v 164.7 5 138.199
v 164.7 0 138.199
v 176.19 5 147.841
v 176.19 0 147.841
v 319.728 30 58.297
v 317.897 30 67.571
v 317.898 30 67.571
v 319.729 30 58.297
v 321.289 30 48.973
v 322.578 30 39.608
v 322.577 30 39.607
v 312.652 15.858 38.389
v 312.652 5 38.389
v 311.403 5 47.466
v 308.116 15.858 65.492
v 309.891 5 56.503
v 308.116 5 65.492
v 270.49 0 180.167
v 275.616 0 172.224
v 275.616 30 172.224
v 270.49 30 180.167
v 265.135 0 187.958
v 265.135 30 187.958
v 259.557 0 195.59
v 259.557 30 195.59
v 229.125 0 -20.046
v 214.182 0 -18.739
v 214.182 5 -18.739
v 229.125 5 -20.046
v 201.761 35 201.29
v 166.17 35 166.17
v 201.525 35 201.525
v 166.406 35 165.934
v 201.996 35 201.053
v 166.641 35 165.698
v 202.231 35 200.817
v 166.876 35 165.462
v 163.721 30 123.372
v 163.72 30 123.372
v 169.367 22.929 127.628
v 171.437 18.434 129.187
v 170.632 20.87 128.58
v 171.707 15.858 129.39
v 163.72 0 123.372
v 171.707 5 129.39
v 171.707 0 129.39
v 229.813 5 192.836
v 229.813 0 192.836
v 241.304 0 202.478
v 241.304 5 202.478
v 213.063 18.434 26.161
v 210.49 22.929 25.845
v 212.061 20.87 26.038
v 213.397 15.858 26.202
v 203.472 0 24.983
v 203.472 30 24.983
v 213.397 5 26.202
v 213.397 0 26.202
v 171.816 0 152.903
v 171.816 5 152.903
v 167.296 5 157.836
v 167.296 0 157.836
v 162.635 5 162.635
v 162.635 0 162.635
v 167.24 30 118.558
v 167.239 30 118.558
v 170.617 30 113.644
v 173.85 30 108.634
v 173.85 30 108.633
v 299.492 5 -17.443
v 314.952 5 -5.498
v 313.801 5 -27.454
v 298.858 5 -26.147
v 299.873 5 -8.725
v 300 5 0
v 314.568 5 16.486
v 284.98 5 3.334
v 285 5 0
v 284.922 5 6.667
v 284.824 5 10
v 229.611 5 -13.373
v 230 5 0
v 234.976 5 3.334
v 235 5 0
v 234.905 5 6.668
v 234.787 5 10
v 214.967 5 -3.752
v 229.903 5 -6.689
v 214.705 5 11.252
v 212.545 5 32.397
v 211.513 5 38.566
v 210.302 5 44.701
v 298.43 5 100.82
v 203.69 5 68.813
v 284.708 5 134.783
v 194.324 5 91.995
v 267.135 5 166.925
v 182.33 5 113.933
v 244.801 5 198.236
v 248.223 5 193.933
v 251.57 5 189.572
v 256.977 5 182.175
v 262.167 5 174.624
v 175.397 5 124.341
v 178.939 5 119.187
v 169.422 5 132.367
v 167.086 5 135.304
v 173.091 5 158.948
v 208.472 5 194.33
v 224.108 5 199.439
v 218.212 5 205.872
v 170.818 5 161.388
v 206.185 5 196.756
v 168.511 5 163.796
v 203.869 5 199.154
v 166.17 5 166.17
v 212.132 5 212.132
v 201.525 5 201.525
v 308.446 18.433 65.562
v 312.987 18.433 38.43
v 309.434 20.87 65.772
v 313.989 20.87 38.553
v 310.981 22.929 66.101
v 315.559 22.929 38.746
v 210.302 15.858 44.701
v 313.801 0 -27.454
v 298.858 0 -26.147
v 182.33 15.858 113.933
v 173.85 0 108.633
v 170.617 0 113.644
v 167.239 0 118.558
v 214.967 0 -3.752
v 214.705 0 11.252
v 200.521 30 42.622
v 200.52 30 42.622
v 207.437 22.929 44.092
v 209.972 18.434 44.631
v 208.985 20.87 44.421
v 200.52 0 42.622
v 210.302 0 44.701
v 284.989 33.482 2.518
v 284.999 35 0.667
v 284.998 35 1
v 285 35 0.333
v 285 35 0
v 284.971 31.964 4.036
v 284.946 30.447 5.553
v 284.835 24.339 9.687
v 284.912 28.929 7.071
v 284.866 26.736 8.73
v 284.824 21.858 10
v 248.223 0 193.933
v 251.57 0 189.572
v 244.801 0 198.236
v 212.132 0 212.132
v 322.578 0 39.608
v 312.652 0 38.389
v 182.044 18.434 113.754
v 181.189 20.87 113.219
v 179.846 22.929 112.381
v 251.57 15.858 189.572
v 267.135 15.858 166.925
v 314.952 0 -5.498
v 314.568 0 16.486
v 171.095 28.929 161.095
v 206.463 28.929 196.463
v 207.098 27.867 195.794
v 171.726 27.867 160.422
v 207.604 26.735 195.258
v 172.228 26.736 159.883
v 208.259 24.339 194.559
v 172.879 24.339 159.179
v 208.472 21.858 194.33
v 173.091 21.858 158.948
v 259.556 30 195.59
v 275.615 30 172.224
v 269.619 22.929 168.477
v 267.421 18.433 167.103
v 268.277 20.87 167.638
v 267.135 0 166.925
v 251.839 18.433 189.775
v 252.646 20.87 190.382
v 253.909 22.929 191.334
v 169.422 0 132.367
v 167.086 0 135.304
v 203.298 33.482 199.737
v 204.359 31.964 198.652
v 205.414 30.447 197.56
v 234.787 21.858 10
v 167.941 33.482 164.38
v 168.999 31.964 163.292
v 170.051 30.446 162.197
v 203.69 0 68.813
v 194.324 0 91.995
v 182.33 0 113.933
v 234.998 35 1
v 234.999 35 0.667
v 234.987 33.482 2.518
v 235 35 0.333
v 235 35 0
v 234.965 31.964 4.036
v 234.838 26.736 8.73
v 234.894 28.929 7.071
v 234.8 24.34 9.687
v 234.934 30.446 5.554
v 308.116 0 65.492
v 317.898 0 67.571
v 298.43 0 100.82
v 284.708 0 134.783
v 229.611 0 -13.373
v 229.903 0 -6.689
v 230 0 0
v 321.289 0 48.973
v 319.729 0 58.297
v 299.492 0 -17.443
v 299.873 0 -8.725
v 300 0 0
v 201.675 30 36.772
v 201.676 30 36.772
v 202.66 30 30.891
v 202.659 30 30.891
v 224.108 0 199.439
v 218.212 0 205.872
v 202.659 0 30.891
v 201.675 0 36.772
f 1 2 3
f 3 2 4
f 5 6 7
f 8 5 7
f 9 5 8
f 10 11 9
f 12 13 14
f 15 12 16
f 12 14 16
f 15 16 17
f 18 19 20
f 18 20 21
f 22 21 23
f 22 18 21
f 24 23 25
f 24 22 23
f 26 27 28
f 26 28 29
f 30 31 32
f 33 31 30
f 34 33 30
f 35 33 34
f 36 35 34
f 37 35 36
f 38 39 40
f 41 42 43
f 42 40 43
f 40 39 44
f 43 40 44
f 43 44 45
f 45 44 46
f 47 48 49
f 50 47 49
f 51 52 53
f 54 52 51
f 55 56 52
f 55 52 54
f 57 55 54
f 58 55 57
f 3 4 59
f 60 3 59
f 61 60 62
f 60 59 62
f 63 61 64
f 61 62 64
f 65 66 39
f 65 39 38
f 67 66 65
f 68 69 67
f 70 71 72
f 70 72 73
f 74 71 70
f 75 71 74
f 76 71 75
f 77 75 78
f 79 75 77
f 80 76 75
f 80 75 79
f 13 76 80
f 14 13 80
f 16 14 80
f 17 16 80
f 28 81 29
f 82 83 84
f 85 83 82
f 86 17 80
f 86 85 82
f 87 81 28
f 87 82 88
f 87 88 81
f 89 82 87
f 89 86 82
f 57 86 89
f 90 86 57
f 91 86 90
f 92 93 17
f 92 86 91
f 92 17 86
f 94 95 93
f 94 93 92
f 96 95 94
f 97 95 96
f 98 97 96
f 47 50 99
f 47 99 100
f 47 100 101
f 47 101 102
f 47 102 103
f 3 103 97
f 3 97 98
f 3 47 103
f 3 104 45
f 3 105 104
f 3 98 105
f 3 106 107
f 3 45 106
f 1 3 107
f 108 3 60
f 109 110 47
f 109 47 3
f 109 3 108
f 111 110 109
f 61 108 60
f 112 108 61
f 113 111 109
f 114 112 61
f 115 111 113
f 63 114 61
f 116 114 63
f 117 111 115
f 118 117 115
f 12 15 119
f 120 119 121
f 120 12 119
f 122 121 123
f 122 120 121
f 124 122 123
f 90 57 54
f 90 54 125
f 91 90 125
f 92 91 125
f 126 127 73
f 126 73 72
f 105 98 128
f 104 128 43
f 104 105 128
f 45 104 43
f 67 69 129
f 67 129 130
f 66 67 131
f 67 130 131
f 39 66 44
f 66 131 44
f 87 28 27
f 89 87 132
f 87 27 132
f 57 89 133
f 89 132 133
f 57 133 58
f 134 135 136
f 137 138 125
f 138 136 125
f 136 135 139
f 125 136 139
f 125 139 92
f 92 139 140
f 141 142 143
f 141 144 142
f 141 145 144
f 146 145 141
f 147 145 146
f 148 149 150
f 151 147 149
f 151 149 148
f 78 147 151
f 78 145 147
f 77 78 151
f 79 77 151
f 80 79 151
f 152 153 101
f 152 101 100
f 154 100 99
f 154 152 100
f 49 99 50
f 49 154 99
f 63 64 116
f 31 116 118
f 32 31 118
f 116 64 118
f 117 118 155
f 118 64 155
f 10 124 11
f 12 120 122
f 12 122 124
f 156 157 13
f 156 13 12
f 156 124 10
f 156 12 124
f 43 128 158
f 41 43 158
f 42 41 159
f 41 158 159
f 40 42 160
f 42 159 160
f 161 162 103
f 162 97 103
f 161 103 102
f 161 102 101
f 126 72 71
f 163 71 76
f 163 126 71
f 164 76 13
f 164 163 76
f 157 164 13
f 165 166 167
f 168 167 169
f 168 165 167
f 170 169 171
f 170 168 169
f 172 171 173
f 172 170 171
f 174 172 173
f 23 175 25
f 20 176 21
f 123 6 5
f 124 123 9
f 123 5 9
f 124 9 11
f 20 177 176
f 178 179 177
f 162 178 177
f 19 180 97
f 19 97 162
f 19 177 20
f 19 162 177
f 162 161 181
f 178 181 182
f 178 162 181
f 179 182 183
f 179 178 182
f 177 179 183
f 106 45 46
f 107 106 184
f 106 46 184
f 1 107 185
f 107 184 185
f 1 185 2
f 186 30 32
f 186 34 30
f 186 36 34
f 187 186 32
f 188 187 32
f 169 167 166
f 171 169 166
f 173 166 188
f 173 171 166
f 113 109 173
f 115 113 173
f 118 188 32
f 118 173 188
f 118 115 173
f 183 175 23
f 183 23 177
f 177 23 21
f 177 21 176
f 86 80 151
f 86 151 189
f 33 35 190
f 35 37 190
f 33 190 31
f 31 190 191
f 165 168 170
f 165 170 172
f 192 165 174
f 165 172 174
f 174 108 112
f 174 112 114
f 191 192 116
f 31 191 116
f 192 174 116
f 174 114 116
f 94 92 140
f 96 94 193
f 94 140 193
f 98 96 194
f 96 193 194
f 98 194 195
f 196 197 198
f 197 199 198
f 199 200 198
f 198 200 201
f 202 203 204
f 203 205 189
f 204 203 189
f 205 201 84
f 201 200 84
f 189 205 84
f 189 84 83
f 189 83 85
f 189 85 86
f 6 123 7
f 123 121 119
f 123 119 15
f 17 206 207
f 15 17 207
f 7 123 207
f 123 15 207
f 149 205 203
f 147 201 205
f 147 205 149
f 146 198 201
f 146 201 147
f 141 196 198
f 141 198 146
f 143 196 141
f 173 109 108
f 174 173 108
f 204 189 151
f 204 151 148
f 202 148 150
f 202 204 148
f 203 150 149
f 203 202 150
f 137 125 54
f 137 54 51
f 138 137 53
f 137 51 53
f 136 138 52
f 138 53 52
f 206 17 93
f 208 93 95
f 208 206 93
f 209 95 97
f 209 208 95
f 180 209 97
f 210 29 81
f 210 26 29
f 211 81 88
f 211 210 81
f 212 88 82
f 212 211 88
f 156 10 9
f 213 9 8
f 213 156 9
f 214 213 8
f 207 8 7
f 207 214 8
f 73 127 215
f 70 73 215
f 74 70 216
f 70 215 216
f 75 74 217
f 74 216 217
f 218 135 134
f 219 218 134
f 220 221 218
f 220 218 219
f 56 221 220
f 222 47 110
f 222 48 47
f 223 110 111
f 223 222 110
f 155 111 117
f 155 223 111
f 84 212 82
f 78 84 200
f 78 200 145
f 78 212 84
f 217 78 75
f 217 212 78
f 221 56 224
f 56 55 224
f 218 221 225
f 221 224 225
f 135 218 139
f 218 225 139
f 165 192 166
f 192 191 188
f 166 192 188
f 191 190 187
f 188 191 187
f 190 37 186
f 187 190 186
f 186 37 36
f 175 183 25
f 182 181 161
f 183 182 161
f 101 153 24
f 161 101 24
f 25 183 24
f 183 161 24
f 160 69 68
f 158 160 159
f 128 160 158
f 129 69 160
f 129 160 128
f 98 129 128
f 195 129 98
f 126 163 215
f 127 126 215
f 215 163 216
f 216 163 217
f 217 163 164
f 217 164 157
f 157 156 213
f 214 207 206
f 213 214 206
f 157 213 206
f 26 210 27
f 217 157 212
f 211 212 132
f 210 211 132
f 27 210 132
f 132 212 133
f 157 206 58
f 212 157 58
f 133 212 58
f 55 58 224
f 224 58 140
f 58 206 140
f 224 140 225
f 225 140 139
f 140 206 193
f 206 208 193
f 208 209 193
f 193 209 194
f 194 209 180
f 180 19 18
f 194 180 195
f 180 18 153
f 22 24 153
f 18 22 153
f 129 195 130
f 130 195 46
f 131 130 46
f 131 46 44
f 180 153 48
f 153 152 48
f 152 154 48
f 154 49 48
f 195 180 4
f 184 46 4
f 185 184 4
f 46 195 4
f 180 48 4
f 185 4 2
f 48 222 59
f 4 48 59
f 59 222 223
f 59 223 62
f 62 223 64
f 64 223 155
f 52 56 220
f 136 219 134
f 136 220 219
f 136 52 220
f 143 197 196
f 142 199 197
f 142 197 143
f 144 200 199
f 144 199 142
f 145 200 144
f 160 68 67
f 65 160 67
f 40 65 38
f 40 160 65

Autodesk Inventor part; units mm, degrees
ref_plane "YZ Plane" through (0, 0, 0) normal (1, 0, 0) x (0, 1, 0)
ref_plane "XZ Plane" through (0, 0, 0) normal (0, 1, 0) x (-1, 0, 0)
ref_plane "XY Plane" through (0, 0, 0) normal (0, 0, 1) x (1, 0, 0)
sketch "Sketch1" plane through (0, 0, 0) normal (0, 1, 0) x (-1, 0, 0)
  circle A0 centre (0, 0) radius 215
  circle A1 centre (0, 0) radius 315
  line L0 (0, 0) -> (-315, 0)
  line L1 (0, 0) -> (-222.7386, 222.7386)
  line L2 (0, 0) -> (-313.8013, -27.4541)
  line L3 (0, 0) -> (-241.304, 202.4781)
  circle A2 centre (0, 0) radius 230
  circle A3 centre (0, 0) radius 300
  point P0 (-152.028, 152.028)
  point P1 (-215, 0)
  point P2 (-212.132, 212.132)
  point P3 (-229.8133, 192.8363)
  point P4 (-298.8584, -26.1467)
  point P5 (-300, 0)
  point P6 (-230, 0)
  point P7 (-229.1248, -20.0458)
  point P8 (-214.1819, -18.7385)
  point P9 (-164.6996, 138.1993)
  point P10 (-176.1902, 147.8412)
  point P11 (-162.6346, 162.6346)
  dimension "d1" = 430
  dimension "d2" = 45
  dimension "d31" = 100
  dimension "d47" = 5
  dimension "d48" = 5
  dimension "d49" = 15
  dimension "d50" = 15
extrude "Extrusion1" add sketch "Sketch1" along normal blind 5 contours L2 A2 L0 A0 | A0 L0 A2 L3 | A2 L3 A3 L1 | A2 L0 A3 L3 | L2 A1 L0 A3 | A3 L0 A1 L3
sketch "Sketch2" plane through (0, 0, 0) normal (0, 1, 0) x (1, 0, 0)
  circle A0 centre (0, 0) radius 205
  circle A1 centre (0, 0) radius 215
  circle A2 centre (0, 0) radius 315
  circle A3 centre (0, 0) radius 325
  line L0 (0, 0) -> (259.5565, -195.5899)
  line L1 (0, 0) -> (275.6156, -172.2238)
  line L2 (0, 0) -> (317.898, -67.5713)
  line L3 (0, 0) -> (322.5775, -39.6075)
  line L4 (300, 0) -> (230, 0) projected
  point P0 (315, 0)
  point P1 (215, 0)
  point P2 (312.652, -38.3888)
  point P3 (308.1165, -65.4922)
  point P4 (213.3974, -26.2019)
  point P5 (203.472, -24.9832)
  point P6 (200.5203, -42.6219)
  point P7 (210.3017, -44.701)
  point P8 (267.1352, -166.9246)
  point P9 (251.5702, -189.5717)
  point P10 (182.3303, -113.9326)
  point P11 (173.8499, -108.6334)
  point P12 (163.7203, -123.3721)
  point P13 (171.7066, -129.3902)
  dimension "d5" = 410
  dimension "d6" = 10
  dimension "d7" = 100
  dimension "d8" = 10
  dimension "d9" = 7
  dimension "d10" = 5
  dimension "d11" = 20
  dimension "d12" = 5
extrude "Extrusion2" add sketch "Sketch2" along normal blind 30 contours A0 L1 A1 L0 | L3 A1 L2 A0 | A2 L1 A3 L0 | L3 A3 L2 A2
chamfer "Chamfer1" distance 10 angle 45 4 edges at (177.1871, 30, 121.7773) (259.5997, 30, 178.418) (212.0514, 30, 35.4852) (310.68, 30, 51.99)
sketch "Sketch3" plane through (0, 5, 0) normal (0, 1, 0) x (1, 0, 0)
  circle A0 centre (0, 0) radius 235
  circle A1 centre (0, 0) radius 285
  arc A2 (251.5702, -189.5717) -> (267.1352, -166.9246) centre (0, 0) ccw projected
  arc A3 (308.1165, -65.4922) -> (312.652, -38.3888) centre (0, 0) ccw projected
  arc A4 (241.304, -202.4781) -> (251.5702, -189.5717) centre (0, 0) ccw projected
  line L0 (300, 0) -> (230, 0) projected
  arc A5 (213.3974, -26.2019) -> (214.1819, 18.7385) centre (0, 0) ccw projected
  line L1 (162.6346, -162.6346) -> (212.132, -212.132) projected
  line L2 (166.1701, -166.1701) -> (201.5254, -201.5254)
  arc A6 (312.652, -38.3888) -> (313.8013, 27.4541) centre (0, 0) ccw projected
  arc A7 (267.1352, -166.9246) -> (308.1165, -65.4922) centre (0, 0) ccw projected
  arc A8 (171.7066, -129.3902) -> (182.3303, -113.9326) centre (0, 0) ccw projected
  arc A9 (164.6996, -138.1993) -> (171.7066, -129.3902) centre (0, 0) ccw projected
  arc A10 (210.3017, -44.701) -> (213.3974, -26.2019) centre (0, 0) ccw projected
  arc A11 (182.3303, -113.9326) -> (210.3017, -44.701) centre (0, 0) ccw projected
  line L3 (235, 0) -> (284.6303, 0)
  line L4 (284.8245, -10) -> (234.7871, -10)
  line L5 (208.4724, -194.3303) -> (173.0906, -158.9485)
  line L6 (229.8133, -192.8363) -> (241.304, -202.4781) projected
  line L7 (313.8013, 27.4541) -> (298.8584, 26.1467) projected
  arc A12 (300, 0) -> (298.8584, 26.1467) centre (0, 0) ccw projected
  arc A13 (230, 0) -> (229.1248, 20.0458) centre (0, 0) ccw projected
  line L8 (229.1248, 20.0458) -> (214.1819, 18.7385) projected
  line L9 (164.6996, -138.1993) -> (176.1902, -147.8412) projected
  arc A14 (162.6346, -162.6346) -> (176.1902, -147.8412) centre (0, 0) ccw projected
  arc A15 (212.132, -212.132) -> (229.8133, -192.8363) centre (0, 0) ccw projected
  point P0 (235, 0)
  point P1 (172.3223, -159.7812)
  point P2 (208.9866, -193.7772)
  point P3 (166.1701, -166.1701)
  point P4 (201.5254, -201.5254)
  point P5 (285, 0)
  point P6 (235, 0)
  point P7 (183.8478, -183.8478)
  point P8 (187.3833, -187.3833)
  dimension "d18" = 470
  dimension "d22" = 0
  dimension "d32" = 50
  dimension "d33" = 10
  dimension "d34" = 0
  dimension "d43" = 10
extrude "Extrusion3" add sketch "Sketch3" along normal blind 30 contours L0 A1 L4 A0 | A0 L5 A1 L1
chamfer "Chamfer3" distance 9 angle 45 2 edges at (259.8058, 35, 10) (190.7815, 35, 176.6394)
fillet "Fillet1" radius 10 6 edges at (259.8058, 26, 10) (310.68, 20.0005, 51.99) (259.5997, 20.0005, 178.418) (177.1871, 20.0005, 121.7773) (212.0514, 20.0005, 35.4852) (190.7815, 26, 176.6394)
sketch "Sketch4" plane through (0, 5, 0) normal (0, 1, 0) x (1, 0, 0)
  arc A0 (201.5254, -201.5254) -> (208.4724, -194.3303) centre (0, 0) ccw projected
  line L0 (201.5254, -201.5254) -> (212.132, -212.132) projected
  arc A1 (241.304, -202.4781) -> (251.5702, -189.5717) centre (0, 0) ccw projected
  arc A2 (251.5702, -189.5717) -> (267.1352, -166.9246) centre (0, 0) ccw projected
  arc A3 (267.1352, -166.9246) -> (308.1165, -65.4922) centre (0, 0) ccw projected
  arc A4 (308.1165, -65.4922) -> (312.652, -38.3888) centre (0, 0) ccw projected
  arc A5 (312.652, -38.3888) -> (313.8013, 27.4541) centre (0, 0) ccw projected
  line L1 (300, 0) -> (285, 0) projected
  arc A6 (284.8245, -10) -> (285, 0) centre (0, 0) ccw projected
  line L2 (284.8245, -10) -> (234.7871, -10) projected
  arc A7 (234.7871, -10) -> (235, 0) centre (0, 0) ccw projected
  line L3 (235, 0) -> (230, 0) projected
  arc A8 (213.3974, -26.2019) -> (214.1819, 18.7385) centre (0, 0) ccw projected
  arc A9 (210.3017, -44.701) -> (213.3974, -26.2019) centre (0, 0) ccw projected
  arc A10 (182.3303, -113.9326) -> (210.3017, -44.701) centre (0, 0) ccw projected
  arc A11 (171.7066, -129.3902) -> (182.3303, -113.9326) centre (0, 0) ccw projected
  arc A12 (164.6996, -138.1993) -> (171.7066, -129.3902) centre (0, 0) ccw projected
  line L4 (162.6346, -162.6346) -> (166.1701, -166.1701) projected
  arc A13 (166.1701, -166.1701) -> (173.0906, -158.9485) centre (0, 0) ccw projected
  line L5 (234.7871, -10) -> (214.7673, -10)
  arc A14 (213.3974, -26.2019) -> (214.1819, 18.7385) centre (0, 0) ccw projected
  line L6 (284.8245, -10) -> (314.8412, -10)
  line L7 (171.8681, -160.2696) -> (157.241, -146.6296)
  line L8 (208.4358, -194.3695) -> (230.3764, -214.8295)
  arc A15 (241.304, -202.4781) -> (251.5702, -189.5717) centre (0, 0) ccw projected
  line L9 (173.0906, -158.9485) -> (208.4724, -194.3303) projected
  arc A16 (230, 0) -> (229.1248, 20.0458) centre (0, 0) ccw projected
  line L10 (229.1248, 20.0458) -> (214.1819, 18.7385) projected
  line L11 (164.6996, -138.1993) -> (176.1902, -147.8412) projected
  arc A17 (162.6346, -162.6346) -> (176.1902, -147.8412) centre (0, 0) ccw projected
  arc A18 (212.132, -212.132) -> (229.8133, -192.8363) centre (0, 0) ccw projected
  line L12 (229.8133, -192.8363) -> (241.304, -202.4781) projected
  line L13 (313.8013, 27.4541) -> (298.8584, 26.1467) projected
  arc A19 (300, 0) -> (298.8584, 26.1467) centre (0, 0) ccw projected
  point P0 (222.7386, -222.7386)
  point P1 (215, 0)
  dimension "d39" = 43
sketch "Sketch5" plane through (0, 5, 0) normal (0, 1, 0) x (1, 0, 0)
  arc A0 (234.7871, -10) -> (235, 0) centre (0, 0) ccw projected
  line L0 (235, 0) -> (230, 0) projected
  arc A1 (213.3974, -26.2019) -> (214.1819, 18.7385) centre (0, 0) ccw projected
  arc A2 (210.3017, -44.701) -> (213.3974, -26.2019) centre (0, 0) ccw projected
  arc A3 (182.3303, -113.9326) -> (210.3017, -44.701) centre (0, 0) ccw projected
  arc A4 (171.7066, -129.3902) -> (182.3303, -113.9326) centre (0, 0) ccw projected
  arc A5 (164.6996, -138.1993) -> (171.7066, -129.3902) centre (0, 0) ccw projected
  line L1 (162.6346, -162.6346) -> (166.1701, -166.1701) projected
  arc A6 (166.1701, -166.1701) -> (173.0906, -158.9485) centre (0, 0) ccw projected
  line L2 (173.0906, -158.9485) -> (208.4724, -194.3303) projected
  arc A7 (201.5254, -201.5254) -> (208.4724, -194.3303) centre (0, 0) ccw projected
  line L3 (201.5254, -201.5254) -> (212.132, -212.132) projected
  arc A8 (241.304, -202.4781) -> (251.5702, -189.5717) centre (0, 0) ccw projected
  arc A9 (251.5702, -189.5717) -> (267.1352, -166.9246) centre (0, 0) ccw projected
  arc A10 (267.1352, -166.9246) -> (308.1165, -65.4922) centre (0, 0) ccw projected
  arc A11 (308.1165, -65.4922) -> (312.652, -38.3888) centre (0, 0) ccw projected
  arc A12 (312.652, -38.3888) -> (313.8013, 27.4541) centre (0, 0) ccw projected
  line L4 (300, 0) -> (285, 0) projected
  arc A13 (284.8245, -10) -> (285, 0) centre (0, 0) ccw projected
  line L5 (284.8245, -10) -> (234.7871, -10) projected
  line L6 (222.7386, -222.7386) -> (0, 0) construction
  line L7 (0, 0) -> (315, 0) construction
  circle A14 centre (0, 0) radius 215
  circle A15 centre (0, 0) radius 315
  arc A16 (230, 0) -> (229.1248, 20.0458) centre (0, 0) ccw projected
  line L8 (229.1248, 20.0458) -> (214.1819, 18.7385) projected
  line L9 (164.6996, -138.1993) -> (176.1902, -147.8412) projected
  arc A17 (162.6346, -162.6346) -> (176.1902, -147.8412) centre (0, 0) ccw projected
  arc A18 (212.132, -212.132) -> (229.8133, -192.8363) centre (0, 0) ccw projected
  line L10 (229.8133, -192.8363) -> (241.304, -202.4781) projected
  line L11 (313.8013, 27.4541) -> (298.8584, 26.1467) projected
  arc A19 (300, 0) -> (298.8584, 26.1467) centre (0, 0) ccw projected
  dimension "d44" = 45
  dimension "d45" = 630
  dimension "d46" = 430
properties part number "MC Plate" material "MDF Medium Density Fiberboard"
